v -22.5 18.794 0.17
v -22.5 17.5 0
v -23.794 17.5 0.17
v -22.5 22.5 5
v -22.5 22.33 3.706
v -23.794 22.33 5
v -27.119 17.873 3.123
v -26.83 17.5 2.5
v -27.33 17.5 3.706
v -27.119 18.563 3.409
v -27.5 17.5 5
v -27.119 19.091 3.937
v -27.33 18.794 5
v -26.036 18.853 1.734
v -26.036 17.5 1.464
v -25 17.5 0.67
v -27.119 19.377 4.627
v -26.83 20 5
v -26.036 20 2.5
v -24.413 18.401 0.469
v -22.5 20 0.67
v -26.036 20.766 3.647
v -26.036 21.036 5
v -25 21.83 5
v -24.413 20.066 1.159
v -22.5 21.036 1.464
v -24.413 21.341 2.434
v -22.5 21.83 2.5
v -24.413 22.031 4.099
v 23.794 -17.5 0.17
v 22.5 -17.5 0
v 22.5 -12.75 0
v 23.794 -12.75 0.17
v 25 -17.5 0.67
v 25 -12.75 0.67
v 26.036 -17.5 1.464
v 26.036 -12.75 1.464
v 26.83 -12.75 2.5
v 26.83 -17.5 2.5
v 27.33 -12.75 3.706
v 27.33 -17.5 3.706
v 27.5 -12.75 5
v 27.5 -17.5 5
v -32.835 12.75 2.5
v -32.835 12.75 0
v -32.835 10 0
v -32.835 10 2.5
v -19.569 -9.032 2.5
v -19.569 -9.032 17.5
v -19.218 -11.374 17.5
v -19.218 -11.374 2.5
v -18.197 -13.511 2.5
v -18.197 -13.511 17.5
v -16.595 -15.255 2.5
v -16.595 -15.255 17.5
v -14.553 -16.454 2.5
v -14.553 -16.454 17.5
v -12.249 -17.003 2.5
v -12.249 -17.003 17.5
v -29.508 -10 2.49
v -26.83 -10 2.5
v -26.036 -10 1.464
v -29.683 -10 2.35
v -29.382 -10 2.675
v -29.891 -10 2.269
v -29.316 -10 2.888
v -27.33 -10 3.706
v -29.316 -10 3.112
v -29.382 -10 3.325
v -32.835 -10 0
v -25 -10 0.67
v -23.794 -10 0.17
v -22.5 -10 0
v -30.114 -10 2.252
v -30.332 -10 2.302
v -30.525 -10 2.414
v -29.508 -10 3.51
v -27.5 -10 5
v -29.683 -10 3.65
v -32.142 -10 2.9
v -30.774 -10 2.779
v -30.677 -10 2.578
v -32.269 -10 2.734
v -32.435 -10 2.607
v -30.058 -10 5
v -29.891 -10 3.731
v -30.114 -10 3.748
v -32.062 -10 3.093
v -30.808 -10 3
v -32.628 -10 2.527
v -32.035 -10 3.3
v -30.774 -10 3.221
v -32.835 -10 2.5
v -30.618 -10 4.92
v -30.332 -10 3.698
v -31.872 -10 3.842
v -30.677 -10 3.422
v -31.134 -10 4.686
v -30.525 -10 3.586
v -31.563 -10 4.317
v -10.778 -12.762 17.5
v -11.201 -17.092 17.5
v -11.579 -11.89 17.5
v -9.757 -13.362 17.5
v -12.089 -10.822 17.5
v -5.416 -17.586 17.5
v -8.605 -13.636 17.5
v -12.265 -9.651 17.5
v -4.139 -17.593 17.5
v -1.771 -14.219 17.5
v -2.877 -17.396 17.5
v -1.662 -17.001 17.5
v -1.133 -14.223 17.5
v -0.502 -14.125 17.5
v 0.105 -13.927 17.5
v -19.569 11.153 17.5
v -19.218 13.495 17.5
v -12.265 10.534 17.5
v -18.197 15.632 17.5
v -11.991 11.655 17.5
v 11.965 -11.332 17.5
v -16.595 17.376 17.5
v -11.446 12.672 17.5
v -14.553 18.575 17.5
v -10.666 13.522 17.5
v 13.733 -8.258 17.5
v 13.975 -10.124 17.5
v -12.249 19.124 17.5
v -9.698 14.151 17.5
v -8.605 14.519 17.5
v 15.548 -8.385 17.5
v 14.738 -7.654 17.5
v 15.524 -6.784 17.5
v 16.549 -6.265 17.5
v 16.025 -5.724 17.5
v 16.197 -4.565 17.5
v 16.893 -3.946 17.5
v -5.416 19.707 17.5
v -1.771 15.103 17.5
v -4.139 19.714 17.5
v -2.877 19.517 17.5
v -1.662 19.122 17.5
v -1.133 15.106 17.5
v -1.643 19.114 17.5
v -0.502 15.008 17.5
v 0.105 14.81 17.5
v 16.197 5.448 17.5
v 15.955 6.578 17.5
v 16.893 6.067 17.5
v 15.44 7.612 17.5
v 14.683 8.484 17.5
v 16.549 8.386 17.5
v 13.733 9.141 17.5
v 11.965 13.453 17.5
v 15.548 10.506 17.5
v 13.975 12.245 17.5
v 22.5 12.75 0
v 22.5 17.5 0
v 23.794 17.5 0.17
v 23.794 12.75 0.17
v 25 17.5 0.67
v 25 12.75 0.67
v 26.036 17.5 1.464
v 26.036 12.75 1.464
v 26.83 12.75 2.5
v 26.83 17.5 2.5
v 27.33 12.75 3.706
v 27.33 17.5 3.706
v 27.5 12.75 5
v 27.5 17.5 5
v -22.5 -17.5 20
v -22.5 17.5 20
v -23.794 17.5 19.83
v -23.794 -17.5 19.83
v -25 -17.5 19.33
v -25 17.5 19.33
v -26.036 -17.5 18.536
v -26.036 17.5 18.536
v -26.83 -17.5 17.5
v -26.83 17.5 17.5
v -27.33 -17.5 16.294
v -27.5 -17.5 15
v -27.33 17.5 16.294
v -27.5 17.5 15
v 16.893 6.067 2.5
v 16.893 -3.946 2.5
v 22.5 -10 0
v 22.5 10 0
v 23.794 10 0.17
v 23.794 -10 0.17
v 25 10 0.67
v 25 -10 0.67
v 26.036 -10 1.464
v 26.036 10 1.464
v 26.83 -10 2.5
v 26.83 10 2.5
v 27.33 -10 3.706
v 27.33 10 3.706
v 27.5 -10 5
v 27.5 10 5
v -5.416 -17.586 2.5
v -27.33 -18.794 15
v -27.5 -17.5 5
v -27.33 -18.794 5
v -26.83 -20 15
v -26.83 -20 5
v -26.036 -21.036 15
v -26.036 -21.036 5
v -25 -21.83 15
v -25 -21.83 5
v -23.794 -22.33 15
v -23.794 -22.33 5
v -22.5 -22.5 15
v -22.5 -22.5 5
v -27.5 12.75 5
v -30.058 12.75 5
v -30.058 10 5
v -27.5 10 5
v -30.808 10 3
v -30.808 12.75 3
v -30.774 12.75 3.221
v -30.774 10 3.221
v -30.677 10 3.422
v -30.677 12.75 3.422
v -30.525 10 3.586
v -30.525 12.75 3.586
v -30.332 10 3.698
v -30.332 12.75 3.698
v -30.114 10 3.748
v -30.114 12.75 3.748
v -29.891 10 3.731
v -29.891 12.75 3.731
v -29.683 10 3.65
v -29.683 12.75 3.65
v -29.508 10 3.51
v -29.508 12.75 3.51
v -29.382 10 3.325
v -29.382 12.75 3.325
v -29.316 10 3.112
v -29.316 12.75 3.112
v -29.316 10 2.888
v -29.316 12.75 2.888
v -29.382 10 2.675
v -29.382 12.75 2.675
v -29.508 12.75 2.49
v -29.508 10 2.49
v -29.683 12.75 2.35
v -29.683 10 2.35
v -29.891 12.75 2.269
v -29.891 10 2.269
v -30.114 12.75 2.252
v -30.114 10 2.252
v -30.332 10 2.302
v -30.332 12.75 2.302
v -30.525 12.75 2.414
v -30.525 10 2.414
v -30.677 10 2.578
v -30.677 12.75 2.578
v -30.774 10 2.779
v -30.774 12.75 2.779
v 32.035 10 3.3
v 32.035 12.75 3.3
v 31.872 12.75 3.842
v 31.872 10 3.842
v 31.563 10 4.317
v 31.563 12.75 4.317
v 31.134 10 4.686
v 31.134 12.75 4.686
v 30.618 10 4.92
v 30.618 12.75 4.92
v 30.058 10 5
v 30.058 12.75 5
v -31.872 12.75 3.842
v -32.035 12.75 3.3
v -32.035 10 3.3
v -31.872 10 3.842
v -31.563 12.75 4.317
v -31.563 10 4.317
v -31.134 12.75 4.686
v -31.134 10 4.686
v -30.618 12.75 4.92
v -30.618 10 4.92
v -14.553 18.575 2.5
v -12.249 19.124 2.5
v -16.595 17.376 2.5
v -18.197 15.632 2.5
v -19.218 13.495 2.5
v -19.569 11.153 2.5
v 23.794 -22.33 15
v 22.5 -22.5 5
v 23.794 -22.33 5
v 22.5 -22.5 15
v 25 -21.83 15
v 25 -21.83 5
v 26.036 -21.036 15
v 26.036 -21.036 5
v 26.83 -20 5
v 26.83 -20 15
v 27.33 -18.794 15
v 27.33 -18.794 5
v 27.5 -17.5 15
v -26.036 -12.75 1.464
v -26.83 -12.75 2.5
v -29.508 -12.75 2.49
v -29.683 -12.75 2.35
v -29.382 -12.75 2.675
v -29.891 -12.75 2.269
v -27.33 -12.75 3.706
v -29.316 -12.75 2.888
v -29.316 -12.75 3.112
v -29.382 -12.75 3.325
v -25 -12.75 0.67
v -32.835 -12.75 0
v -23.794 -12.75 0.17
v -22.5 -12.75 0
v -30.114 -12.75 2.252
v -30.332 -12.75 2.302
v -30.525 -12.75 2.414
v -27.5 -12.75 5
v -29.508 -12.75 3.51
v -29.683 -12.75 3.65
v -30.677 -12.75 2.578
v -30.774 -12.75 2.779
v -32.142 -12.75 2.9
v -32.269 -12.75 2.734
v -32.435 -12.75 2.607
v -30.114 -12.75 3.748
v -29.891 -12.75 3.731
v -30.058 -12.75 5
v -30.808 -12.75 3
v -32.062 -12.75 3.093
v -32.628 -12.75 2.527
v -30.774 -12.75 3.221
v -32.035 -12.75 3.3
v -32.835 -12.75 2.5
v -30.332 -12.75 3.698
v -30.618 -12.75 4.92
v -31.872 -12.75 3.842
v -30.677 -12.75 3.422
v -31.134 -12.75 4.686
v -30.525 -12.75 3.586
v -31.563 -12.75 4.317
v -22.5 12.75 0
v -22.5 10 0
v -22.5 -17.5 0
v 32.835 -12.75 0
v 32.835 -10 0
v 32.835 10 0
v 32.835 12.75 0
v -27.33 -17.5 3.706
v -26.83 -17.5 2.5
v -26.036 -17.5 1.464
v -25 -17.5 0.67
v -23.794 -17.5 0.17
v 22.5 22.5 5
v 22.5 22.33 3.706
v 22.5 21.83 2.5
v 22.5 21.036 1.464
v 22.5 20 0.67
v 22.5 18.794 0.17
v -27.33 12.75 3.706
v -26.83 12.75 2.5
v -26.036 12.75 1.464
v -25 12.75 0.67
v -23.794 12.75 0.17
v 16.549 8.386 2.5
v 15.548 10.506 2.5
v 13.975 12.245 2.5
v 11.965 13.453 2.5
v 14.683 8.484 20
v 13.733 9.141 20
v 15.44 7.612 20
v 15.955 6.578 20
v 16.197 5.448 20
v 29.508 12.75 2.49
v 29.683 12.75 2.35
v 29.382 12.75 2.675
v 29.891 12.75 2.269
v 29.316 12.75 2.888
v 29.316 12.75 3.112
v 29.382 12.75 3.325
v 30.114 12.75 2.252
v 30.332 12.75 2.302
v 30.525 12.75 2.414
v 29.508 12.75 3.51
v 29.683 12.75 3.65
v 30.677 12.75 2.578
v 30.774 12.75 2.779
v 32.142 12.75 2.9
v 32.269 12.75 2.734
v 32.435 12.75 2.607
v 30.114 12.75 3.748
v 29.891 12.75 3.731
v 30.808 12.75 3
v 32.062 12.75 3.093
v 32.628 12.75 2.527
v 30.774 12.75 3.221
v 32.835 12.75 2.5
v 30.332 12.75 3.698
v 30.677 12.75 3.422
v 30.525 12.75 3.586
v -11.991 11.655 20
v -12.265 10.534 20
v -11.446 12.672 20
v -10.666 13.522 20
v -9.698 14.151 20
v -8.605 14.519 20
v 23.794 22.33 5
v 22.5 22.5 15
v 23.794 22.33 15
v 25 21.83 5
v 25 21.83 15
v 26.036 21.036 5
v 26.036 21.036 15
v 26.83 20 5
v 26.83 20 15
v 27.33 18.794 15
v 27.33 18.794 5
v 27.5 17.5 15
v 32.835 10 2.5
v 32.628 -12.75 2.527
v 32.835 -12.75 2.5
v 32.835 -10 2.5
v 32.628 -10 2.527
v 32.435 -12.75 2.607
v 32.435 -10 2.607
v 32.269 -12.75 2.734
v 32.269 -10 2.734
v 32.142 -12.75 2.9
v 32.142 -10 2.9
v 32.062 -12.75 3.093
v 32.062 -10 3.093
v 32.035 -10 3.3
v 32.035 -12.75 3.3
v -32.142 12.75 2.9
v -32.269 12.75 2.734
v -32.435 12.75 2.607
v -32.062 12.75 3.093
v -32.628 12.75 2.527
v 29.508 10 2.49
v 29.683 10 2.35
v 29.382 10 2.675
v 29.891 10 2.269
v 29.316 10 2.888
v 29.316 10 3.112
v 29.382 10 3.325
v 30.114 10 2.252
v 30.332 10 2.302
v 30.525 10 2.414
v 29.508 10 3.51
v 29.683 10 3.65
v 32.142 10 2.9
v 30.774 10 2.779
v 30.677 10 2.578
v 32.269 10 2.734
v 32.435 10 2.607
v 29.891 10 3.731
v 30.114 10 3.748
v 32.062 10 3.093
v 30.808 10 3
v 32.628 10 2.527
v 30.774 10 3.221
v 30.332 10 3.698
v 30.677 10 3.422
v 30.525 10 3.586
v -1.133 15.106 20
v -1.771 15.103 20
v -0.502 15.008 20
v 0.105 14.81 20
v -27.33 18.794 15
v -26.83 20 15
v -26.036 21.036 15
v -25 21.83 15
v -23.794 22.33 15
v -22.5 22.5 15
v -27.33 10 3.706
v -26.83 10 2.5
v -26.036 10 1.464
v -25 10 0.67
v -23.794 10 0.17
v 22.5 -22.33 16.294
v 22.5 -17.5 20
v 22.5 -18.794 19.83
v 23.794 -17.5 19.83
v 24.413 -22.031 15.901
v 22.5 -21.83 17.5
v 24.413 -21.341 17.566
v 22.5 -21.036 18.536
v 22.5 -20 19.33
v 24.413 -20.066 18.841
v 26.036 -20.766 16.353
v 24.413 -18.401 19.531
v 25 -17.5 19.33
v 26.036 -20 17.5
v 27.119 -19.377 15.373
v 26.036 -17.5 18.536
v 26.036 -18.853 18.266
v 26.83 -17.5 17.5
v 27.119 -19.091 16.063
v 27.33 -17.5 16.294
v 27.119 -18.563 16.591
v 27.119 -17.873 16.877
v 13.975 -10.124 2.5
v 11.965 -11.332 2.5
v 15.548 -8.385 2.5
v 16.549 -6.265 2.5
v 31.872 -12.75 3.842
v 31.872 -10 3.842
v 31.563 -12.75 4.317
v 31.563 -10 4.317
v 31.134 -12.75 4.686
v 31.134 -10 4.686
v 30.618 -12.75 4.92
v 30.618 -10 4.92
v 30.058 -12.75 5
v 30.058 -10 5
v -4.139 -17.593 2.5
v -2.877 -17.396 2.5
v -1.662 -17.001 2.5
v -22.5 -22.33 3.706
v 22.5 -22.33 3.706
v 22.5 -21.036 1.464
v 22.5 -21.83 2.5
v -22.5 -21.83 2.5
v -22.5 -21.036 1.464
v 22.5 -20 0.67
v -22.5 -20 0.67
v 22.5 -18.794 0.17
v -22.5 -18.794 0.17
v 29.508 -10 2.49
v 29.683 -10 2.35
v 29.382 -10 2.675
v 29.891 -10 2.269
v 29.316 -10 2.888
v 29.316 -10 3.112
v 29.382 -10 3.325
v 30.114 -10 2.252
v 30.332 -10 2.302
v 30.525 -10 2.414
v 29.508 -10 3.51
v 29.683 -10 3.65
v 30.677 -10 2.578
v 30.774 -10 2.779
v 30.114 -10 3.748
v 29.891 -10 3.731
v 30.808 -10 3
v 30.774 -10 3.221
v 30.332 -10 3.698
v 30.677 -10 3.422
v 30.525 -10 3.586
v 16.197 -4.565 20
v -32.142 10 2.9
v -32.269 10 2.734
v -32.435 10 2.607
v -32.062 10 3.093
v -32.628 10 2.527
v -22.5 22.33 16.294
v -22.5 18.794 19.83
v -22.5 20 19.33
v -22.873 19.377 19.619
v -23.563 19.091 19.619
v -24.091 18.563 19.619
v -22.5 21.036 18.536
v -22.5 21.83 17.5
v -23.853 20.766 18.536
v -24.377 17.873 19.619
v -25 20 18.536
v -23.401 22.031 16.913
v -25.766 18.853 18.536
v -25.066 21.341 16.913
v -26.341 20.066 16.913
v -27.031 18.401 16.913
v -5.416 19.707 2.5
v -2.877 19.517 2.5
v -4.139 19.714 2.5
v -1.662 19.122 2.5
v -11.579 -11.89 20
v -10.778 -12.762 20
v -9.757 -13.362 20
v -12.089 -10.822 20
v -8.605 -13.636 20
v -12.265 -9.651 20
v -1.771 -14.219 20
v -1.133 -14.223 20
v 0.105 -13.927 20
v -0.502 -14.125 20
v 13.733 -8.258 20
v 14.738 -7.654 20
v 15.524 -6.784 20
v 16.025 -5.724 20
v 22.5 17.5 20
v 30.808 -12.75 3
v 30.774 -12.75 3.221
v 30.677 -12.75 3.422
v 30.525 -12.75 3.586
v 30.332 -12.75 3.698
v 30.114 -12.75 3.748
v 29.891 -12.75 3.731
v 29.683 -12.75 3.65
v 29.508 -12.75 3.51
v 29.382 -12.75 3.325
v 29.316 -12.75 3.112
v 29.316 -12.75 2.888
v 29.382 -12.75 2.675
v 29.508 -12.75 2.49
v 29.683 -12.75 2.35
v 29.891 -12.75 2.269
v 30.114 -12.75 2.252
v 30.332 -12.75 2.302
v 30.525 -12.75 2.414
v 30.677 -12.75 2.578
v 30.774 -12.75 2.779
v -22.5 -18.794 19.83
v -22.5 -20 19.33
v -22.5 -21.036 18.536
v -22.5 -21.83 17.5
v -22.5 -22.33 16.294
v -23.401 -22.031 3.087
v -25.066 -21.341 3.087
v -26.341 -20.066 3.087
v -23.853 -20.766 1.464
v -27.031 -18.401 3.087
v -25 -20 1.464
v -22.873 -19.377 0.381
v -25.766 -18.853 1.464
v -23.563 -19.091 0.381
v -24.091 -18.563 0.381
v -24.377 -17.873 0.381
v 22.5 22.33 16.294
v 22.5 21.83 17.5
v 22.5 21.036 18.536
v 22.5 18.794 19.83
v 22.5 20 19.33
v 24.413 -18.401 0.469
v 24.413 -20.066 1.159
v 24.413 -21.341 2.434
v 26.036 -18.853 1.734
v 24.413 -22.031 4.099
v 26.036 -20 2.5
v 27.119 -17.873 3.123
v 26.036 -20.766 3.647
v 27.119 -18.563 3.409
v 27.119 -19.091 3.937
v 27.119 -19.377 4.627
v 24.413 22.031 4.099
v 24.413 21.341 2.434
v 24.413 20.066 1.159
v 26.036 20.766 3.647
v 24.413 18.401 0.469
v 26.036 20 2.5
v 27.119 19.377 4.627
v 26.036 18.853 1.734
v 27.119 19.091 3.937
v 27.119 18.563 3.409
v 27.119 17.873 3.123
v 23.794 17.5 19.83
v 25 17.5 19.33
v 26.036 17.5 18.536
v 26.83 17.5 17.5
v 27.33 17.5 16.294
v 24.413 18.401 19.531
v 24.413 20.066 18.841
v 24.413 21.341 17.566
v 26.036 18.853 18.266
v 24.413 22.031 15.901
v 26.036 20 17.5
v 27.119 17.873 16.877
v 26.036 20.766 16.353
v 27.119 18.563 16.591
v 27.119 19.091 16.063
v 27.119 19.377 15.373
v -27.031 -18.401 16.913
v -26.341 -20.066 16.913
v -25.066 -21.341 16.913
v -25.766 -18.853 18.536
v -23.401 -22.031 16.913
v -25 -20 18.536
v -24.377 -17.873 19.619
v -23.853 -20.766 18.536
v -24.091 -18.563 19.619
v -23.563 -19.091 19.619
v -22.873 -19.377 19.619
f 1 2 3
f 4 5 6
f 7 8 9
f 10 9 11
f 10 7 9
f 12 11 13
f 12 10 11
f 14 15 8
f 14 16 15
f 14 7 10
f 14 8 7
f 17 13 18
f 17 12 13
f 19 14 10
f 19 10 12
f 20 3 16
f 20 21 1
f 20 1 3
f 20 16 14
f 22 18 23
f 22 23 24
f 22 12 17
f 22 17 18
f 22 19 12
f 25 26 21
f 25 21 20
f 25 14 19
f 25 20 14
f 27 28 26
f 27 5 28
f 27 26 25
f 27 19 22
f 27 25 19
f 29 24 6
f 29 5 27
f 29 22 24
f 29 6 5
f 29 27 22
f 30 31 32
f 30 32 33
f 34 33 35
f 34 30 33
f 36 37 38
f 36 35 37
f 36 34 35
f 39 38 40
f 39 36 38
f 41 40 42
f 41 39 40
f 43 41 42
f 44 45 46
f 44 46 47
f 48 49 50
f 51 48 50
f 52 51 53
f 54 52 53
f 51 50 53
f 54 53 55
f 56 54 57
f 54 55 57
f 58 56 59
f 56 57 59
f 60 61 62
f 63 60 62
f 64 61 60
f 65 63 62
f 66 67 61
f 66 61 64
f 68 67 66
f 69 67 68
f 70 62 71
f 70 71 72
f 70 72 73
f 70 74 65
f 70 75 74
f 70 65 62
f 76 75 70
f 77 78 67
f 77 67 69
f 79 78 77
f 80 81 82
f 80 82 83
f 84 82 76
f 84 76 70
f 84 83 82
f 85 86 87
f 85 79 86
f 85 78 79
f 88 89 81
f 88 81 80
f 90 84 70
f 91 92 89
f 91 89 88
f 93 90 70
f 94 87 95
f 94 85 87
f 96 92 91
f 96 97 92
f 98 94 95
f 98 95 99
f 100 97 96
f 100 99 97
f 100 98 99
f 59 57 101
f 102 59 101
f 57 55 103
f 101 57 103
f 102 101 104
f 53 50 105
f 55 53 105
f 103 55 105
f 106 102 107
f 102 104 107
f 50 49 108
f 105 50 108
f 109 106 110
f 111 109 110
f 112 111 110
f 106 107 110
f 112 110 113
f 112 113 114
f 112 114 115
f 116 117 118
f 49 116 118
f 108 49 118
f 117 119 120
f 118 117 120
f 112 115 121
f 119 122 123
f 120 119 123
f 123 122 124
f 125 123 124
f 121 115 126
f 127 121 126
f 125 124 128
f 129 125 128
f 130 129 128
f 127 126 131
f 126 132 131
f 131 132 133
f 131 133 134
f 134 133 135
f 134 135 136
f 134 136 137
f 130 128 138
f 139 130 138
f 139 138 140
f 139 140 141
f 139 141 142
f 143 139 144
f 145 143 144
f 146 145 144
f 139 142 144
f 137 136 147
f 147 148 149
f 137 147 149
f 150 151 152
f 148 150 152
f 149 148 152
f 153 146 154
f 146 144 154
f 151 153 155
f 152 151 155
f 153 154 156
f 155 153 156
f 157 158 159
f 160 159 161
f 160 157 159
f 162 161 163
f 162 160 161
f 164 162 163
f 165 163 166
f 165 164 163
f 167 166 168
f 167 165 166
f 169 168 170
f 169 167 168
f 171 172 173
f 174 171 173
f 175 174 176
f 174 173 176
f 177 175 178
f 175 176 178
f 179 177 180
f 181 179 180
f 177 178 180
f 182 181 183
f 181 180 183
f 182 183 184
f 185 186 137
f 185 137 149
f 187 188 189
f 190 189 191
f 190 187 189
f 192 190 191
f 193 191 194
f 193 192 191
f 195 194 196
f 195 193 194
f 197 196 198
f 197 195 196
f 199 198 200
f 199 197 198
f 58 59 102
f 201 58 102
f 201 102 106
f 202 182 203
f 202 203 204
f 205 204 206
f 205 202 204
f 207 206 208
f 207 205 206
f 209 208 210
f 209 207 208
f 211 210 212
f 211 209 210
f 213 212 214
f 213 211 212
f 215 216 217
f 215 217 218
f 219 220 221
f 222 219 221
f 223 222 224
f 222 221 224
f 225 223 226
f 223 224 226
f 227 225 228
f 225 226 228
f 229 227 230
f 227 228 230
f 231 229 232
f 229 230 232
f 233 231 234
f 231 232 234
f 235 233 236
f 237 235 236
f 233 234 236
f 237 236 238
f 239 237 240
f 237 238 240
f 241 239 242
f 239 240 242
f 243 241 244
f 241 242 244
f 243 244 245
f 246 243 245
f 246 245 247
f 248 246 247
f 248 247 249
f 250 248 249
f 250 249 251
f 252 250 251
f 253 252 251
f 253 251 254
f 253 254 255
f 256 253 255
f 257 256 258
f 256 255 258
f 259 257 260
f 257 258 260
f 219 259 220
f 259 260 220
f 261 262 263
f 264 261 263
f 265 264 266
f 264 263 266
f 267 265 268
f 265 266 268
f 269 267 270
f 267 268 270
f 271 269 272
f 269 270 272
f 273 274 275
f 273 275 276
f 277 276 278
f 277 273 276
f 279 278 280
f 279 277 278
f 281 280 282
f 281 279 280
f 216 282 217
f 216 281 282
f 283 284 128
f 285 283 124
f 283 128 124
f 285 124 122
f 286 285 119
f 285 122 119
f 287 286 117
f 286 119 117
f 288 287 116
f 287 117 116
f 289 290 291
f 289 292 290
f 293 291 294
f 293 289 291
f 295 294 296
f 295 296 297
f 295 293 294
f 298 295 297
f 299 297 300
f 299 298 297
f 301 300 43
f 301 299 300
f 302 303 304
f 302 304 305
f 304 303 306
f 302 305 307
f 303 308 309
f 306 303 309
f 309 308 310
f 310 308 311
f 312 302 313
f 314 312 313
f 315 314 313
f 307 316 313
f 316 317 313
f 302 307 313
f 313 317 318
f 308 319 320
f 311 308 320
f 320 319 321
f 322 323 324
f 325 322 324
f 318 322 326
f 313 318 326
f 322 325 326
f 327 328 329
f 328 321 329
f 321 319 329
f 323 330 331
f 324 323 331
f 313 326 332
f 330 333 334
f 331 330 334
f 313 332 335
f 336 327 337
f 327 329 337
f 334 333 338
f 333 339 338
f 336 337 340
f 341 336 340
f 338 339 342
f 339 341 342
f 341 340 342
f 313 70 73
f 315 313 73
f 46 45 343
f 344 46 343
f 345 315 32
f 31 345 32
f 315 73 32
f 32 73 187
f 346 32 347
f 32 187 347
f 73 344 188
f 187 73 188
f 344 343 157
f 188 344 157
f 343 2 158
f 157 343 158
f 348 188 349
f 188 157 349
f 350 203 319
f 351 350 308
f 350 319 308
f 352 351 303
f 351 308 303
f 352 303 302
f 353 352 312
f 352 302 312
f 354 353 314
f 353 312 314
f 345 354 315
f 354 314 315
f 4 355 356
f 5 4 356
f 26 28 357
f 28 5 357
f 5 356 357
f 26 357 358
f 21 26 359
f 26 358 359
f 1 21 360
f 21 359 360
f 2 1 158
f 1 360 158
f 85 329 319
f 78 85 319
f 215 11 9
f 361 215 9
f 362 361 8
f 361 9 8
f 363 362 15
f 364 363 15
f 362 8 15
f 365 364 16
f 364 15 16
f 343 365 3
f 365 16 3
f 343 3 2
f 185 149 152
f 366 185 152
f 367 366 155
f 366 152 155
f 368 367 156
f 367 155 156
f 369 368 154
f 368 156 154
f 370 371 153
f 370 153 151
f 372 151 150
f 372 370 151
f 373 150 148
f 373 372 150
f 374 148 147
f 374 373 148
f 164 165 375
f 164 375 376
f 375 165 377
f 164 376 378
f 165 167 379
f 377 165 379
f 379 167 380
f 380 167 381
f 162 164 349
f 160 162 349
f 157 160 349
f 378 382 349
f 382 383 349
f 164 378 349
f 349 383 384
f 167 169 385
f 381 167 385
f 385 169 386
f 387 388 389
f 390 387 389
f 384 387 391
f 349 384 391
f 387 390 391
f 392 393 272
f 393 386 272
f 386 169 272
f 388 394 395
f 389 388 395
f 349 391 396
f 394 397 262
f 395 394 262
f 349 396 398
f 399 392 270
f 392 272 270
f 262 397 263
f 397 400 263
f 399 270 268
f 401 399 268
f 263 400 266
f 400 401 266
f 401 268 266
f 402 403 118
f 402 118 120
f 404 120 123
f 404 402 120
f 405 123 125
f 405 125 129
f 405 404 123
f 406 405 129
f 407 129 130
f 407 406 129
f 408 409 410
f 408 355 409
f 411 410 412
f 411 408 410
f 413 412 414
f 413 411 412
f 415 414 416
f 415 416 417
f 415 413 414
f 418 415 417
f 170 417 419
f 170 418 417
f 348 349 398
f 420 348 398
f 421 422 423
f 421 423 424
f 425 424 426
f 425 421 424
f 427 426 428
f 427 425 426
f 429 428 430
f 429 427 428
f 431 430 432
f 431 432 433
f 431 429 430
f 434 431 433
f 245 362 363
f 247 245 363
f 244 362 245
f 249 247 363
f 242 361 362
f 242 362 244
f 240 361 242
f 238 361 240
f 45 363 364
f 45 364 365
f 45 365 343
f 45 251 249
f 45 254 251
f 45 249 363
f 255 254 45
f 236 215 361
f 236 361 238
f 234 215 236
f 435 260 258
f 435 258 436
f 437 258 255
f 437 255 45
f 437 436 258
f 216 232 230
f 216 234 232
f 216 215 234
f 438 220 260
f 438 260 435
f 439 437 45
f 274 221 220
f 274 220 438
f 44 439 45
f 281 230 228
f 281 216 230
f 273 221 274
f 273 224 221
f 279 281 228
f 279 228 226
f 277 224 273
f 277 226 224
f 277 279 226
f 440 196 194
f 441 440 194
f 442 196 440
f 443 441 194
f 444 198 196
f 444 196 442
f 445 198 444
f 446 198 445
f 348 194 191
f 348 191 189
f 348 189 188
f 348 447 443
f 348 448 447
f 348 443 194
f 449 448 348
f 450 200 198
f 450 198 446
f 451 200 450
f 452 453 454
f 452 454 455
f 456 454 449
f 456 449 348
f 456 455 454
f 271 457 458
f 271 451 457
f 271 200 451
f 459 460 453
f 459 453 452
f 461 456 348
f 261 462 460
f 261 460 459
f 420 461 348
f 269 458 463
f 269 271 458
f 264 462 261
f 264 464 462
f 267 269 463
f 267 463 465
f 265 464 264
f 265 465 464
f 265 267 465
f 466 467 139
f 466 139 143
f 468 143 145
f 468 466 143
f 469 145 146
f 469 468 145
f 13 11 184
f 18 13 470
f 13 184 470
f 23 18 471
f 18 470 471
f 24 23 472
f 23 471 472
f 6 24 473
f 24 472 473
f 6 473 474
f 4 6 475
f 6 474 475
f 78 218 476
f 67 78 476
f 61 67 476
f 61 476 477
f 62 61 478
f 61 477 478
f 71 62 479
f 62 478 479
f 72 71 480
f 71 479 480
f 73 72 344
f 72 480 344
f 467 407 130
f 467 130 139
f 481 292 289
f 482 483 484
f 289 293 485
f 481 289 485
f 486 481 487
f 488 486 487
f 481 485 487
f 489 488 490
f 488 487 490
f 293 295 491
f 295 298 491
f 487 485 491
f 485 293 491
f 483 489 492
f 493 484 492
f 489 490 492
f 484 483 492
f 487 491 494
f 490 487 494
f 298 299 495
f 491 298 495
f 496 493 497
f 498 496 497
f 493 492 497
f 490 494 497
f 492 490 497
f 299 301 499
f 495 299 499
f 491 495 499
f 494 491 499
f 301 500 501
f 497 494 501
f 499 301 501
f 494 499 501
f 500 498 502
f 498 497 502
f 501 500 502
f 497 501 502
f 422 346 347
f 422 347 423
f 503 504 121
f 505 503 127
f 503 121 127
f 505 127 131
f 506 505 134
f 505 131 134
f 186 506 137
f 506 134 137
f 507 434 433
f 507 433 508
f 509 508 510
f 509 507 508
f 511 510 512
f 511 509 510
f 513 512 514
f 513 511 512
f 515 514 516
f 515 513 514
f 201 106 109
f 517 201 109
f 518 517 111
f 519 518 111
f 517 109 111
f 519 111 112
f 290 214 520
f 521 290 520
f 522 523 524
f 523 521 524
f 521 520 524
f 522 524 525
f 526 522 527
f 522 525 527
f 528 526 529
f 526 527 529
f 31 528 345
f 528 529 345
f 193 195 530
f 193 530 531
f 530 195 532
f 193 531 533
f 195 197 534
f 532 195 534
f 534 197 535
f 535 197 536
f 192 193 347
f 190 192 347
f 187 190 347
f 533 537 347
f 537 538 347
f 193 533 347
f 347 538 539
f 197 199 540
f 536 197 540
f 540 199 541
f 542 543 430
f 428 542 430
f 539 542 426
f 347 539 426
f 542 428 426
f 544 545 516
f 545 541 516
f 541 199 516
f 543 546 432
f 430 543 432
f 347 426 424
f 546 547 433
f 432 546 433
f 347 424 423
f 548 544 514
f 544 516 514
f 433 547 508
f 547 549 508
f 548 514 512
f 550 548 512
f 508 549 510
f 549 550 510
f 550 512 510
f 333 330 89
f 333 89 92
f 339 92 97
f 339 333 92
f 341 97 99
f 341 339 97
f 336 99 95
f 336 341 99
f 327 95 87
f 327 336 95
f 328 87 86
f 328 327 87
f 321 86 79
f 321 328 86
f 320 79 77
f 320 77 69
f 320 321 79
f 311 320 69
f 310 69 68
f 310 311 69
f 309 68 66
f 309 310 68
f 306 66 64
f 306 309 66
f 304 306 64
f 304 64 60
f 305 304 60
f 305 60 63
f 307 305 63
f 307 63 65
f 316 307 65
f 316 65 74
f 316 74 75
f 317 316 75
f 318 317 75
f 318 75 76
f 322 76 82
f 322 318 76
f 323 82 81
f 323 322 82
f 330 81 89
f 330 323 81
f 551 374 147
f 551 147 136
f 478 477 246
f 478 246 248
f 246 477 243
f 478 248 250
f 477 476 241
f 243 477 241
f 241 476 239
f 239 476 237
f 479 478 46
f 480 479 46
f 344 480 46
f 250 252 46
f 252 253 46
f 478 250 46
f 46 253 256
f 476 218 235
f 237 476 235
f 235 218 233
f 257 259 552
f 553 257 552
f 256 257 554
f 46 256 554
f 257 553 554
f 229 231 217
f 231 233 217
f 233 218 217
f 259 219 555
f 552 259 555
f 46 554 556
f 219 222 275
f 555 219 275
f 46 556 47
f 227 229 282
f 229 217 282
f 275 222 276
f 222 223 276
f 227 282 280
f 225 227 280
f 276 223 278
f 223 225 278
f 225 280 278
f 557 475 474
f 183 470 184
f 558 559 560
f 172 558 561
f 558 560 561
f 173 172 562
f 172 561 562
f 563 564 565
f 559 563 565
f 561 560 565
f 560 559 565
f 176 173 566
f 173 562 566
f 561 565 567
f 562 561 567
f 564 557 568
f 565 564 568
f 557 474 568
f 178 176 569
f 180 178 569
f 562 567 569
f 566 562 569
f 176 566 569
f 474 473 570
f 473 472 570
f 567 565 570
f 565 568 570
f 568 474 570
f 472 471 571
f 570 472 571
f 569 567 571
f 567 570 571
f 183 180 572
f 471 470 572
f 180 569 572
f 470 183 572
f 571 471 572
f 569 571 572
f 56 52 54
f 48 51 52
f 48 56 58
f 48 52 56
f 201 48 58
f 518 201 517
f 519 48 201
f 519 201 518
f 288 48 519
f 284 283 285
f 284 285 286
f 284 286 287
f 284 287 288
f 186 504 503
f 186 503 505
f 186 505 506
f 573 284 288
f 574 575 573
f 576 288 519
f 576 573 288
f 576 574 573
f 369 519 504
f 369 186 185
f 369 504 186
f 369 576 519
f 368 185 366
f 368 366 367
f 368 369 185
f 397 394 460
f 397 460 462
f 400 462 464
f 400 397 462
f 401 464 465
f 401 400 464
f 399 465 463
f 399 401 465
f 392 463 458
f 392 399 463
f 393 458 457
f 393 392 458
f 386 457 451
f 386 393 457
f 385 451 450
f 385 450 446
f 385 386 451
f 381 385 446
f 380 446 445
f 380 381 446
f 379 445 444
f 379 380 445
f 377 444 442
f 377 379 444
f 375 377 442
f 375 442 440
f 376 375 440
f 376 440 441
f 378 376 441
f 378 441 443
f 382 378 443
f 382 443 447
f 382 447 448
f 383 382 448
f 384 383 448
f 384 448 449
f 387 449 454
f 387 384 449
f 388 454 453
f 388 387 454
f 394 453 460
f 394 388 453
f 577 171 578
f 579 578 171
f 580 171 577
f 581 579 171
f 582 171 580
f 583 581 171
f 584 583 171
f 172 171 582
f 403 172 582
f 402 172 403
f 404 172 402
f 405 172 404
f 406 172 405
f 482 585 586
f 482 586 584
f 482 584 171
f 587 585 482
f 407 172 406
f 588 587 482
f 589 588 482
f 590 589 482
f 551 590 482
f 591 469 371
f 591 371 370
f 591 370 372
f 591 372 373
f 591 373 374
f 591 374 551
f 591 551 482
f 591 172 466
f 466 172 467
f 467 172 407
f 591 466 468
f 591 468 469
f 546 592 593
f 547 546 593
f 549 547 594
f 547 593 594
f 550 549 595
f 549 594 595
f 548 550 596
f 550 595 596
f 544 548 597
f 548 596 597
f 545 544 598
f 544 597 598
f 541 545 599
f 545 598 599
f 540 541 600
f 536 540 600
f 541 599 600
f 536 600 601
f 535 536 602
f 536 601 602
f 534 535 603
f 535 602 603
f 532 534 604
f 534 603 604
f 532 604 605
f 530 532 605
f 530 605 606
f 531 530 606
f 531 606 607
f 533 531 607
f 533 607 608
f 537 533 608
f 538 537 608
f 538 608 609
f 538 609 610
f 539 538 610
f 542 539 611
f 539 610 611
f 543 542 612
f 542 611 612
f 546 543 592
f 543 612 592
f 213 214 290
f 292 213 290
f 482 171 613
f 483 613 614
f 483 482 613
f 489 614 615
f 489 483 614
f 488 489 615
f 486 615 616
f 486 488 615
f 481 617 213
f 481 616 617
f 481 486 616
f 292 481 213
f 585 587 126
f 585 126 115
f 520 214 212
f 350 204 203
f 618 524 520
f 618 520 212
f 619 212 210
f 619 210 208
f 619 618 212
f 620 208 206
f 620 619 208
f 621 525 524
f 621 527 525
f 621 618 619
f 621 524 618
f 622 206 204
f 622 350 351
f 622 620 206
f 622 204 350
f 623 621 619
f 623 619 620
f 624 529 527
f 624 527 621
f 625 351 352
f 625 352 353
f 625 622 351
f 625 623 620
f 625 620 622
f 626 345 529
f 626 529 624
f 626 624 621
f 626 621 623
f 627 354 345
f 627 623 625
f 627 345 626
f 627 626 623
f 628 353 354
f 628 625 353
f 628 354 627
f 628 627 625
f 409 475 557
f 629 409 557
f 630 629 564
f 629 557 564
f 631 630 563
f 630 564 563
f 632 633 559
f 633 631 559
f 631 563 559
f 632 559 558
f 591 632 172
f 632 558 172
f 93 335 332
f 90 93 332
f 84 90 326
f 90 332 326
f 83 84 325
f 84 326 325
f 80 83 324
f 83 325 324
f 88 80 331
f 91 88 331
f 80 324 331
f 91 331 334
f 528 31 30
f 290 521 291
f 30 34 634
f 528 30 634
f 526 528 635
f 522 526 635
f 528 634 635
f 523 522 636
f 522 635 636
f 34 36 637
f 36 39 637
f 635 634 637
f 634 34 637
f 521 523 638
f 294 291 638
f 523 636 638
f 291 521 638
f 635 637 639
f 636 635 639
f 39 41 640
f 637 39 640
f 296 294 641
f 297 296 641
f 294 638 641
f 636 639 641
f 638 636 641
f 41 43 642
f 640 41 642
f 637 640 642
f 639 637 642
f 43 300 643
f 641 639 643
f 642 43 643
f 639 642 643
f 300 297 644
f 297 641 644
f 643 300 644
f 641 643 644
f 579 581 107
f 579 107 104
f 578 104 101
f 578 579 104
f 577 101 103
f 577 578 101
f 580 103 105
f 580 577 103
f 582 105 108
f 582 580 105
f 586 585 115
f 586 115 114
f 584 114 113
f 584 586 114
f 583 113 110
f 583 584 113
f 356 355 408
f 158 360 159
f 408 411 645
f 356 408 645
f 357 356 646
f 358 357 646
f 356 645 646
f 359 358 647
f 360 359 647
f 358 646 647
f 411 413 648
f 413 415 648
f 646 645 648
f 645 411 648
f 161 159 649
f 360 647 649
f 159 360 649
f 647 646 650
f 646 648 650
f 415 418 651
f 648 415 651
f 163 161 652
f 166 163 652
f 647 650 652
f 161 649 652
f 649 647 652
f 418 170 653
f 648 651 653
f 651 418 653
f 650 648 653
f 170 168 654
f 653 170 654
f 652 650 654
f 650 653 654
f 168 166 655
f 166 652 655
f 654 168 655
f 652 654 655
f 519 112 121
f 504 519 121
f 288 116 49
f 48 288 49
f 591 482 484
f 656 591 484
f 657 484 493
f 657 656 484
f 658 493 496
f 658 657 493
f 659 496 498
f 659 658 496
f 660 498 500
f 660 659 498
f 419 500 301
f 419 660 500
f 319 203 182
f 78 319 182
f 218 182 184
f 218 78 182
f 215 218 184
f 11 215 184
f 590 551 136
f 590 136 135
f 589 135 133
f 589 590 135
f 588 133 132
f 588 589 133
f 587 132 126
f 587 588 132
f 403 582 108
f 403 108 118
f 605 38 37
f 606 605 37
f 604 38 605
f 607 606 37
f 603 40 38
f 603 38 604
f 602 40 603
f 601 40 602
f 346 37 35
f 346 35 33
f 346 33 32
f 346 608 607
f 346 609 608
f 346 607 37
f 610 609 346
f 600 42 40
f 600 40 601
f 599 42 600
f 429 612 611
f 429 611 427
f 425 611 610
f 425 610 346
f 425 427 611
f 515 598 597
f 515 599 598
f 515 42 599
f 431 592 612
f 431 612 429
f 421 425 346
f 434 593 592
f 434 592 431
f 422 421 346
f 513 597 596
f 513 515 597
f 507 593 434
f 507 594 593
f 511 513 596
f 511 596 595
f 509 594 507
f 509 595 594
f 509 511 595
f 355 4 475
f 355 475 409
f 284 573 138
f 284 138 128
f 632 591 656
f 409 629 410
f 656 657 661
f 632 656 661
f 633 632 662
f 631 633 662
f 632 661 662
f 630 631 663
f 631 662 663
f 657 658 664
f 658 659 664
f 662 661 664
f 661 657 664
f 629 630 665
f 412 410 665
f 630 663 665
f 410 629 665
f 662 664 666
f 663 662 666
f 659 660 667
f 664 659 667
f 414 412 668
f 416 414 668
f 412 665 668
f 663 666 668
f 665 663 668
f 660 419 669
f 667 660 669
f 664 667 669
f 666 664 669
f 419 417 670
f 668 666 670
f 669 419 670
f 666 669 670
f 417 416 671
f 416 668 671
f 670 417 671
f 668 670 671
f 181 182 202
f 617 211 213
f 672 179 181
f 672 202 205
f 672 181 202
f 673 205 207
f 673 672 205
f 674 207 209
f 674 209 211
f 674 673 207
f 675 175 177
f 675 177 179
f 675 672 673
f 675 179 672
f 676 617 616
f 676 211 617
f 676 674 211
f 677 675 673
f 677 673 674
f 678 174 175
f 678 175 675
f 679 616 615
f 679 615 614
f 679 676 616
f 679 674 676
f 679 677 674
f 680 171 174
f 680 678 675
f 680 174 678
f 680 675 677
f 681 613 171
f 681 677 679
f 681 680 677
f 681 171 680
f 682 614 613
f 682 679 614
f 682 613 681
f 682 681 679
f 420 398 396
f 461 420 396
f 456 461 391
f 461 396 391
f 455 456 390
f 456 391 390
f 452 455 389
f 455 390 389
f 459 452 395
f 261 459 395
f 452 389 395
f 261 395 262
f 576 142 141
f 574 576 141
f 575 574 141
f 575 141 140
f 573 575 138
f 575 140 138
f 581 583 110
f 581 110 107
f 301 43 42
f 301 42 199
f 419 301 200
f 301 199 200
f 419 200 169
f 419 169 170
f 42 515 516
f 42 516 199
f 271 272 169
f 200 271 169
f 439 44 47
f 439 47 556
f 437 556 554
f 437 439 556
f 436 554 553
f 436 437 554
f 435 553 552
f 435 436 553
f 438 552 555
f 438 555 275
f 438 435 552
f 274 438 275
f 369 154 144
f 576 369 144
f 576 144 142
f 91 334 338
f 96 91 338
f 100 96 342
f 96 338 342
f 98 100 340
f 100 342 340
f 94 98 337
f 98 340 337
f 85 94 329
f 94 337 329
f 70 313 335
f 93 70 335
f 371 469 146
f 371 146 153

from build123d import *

# Parameters (mm, degrees)
F0_W              = 55
F0_H              = 45
F1_DEPTH          = 20
F5_DEPTH          = 17.5
F7_DEPTH          = 2.5
F9_R              = 5
F10_F1_R          = 5
F10_F2_R          = 5
F11_T1_DEPTH      = 35
F11_T3_DEPTH      = 62.5
F11_S7_W          = 5
F11_S7_H          = 5
F11_T8_DEPTH      = 5
F11_T12_ANGLE     = 90
F12_R             = 5
F15_R             = 0.75
F16_DEPTH         = 2.75
F16_COPIES2_COUNT = 2


# Not quite as in the source:
# - a fillet or chamfer that OpenCascade refuses, or shapes differently, is made with other operations: its cross-section is extruded or revolved along the edge and cut away or added
# - a feature of the source that left no trace in its solid (it failed there, or was rolled back) is left out
# - a pattern or mirror of a feature is missing from the dataset's text; its kind, count and spacing are read off the source's solid


with BuildPart() as f1:
    # F0 (on Top) → F1 (new body)
    with BuildSketch(Plane.XY):
        Rectangle(F0_W, F0_H)
    extrude(amount=F1_DEPTH)

    # F4 (on face) → F5 (cut)
    with BuildSketch(Plane.XY.offset(20)):
        with BuildLine():
            Line((-19.5686819828, 11.1526907945), (-19.5686819828, 1.0604560375))
            Line((-19.5686819828, 1.0604560375), (-19.5686819828, -9.0317787194))
            ThreePointArc((-19.5686819828, -9.0317787194), (-17.4612029419, -14.4427117948), (-12.2491327961, -17.0027878582))
            Line((-12.2491327961, -17.0027878582), (-5.4155437946, -17.5861419999))
            ThreePointArc((-5.4155437946, -17.5861419999), (-3.5037525417, -17.5198024128), (-1.6623660017, -17.0014952208))
            Line((-1.6623660017, -17.0014952208), (11.9654898342, -11.3323067543))
            ThreePointArc((11.9654898342, -11.3323067543), (15.5479043196, -8.3854367171), (16.8927628547, -3.9459443945))
            Line((16.8927628547, -3.9459443945), (16.8927628547, 1.0604560375))
            Line((16.8927628547, 1.0604560375), (16.8927628547, 6.0668564696))
            ThreePointArc((16.8927628547, 6.0668564696), (15.5479043196, 10.5063487921), (11.9654898342, 13.4532188293))
            Line((11.9654898342, 13.4532188293), (-1.6623660017, 19.1224072959))
            ThreePointArc((-1.6623660017, 19.1224072959), (-3.5037525417, 19.6407144879), (-5.4155437946, 19.7070540749))
            Line((-5.4155437946, 19.7070540749), (-12.2491327961, 19.1236999333))
            ThreePointArc((-12.2491327961, 19.1236999333), (-17.4612029419, 16.5636238699), (-19.5686819828, 11.1526907945))
        make_face()
    extrude(amount=-F5_DEPTH, mode=Mode.SUBTRACT)

    # F6 (on face) → F7 (join)
    with BuildSketch(Plane.XY.offset(20)):
        with BuildLine():
            ThreePointArc((-12.2491327961, 19.1236999333), (-17.4612029419, 16.5636238699), (-19.5686819828, 11.1526907945))
            Line((-19.5686819828, 11.1526907945), (-19.5686819828, -9.0317787194))
            ThreePointArc((-19.5686819828, -9.0317787194), (-17.4612029419, -14.4427117948), (-12.2491327961, -17.0027878582))
            Line((-12.2491327961, -17.0027878582), (-11.2008683554, -17.0922736911))
            Line((-11.2008683554, -17.0922736911), (-5.4155437946, -17.5861419999))
            ThreePointArc((-5.4155437946, -17.5861419999), (-3.5037525417, -17.5198024128), (-1.6623660017, -17.0014952208))
            Line((-1.6623660017, -17.0014952208), (11.9654898342, -11.3323067543))
            ThreePointArc((11.9654898342, -11.3323067543), (15.5479043196, -8.3854367171), (16.8927628547, -3.9459443945))
            Line((16.8927628547, -3.9459443945), (16.8927628547, 6.0668564696))
            ThreePointArc((16.8927628547, 6.0668564696), (15.5479043196, 10.5063487921), (11.9654898342, 13.4532188293))
            Line((11.9654898342, 13.4532188293), (-1.6432446132, 19.1144527977))
            Line((-1.6432446132, 19.1144527977), (-1.6623660017, 19.1224072959))
            ThreePointArc((-1.6623660017, 19.1224072959), (-3.5037525417, 19.6407144879), (-5.4155437946, 19.7070540749))
            Line((-5.4155437946, 19.7070540749), (-12.2491327961, 19.1236999333))
        make_face()
        with BuildLine():
            Line((-12.2647350556, -9.6505587512), (-12.2647350556, 0.4416760057))
            Line((-12.2647350556, 0.4416760057), (-12.2647350556, 10.5339107627))
            ThreePointArc((-12.2647350556, 10.5339107627), (-11.0828219735, 13.1216791931), (-8.6049604623, 14.5194153321))
            Line((-8.6049604623, 14.5194153321), (-1.7713714607, 15.1027694737))
            ThreePointArc((-1.7713714607, 15.1027694737), (-0.8154758343, 15.0695996802), (0.1052174357, 14.8104460842))
            Line((0.1052174357, 14.8104460842), (13.7330732716, 9.1412576176))
            ThreePointArc((13.7330732716, 9.1412576176), (15.4399139751, 7.6115436145), (16.1967097819, 5.4480764378))
            Line((16.1967097819, 5.4480764378), (16.1967097819, 0.4416760057))
            Line((16.1967097819, 0.4416760057), (16.1967097819, -4.5647244263))
            ThreePointArc((16.1967097819, -4.5647244263), (15.5242805143, -6.7844705876), (13.7330732716, -8.2579056062))
            Line((13.7330732716, -8.2579056062), (0.1052174357, -13.9270940728))
            ThreePointArc((0.1052174357, -13.9270940728), (-0.8154758343, -14.1862476688), (-1.7713714607, -14.2194174623))
            Line((-1.7713714607, -14.2194174623), (-8.6049604623, -13.6360633206))
            ThreePointArc((-8.6049604623, -13.6360633206), (-11.2109955351, -12.3560252889), (-12.2647350556, -9.6505587512))
        make_face(mode=Mode.SUBTRACT)
    extrude(amount=-F7_DEPTH)

    # F9
    f9_edges = [f1.edges().sort_by_distance(p)[0] for p in [
        (-27.5, -22.5, 10),
        (0, -22.5, 20),
    ]]
    fillet(f9_edges, radius=F9_R)

    # F10: fillet of radius 5 on 2 edges, made by hand

    # F10_f1
    f10_f1_edges = [f1.edges().sort_by_distance(p)[0] for p in [
        (0, 22.5, 0),
    ]]
    fillet(f10_f1_edges, radius=F10_F1_R)

    # F10_f2
    f10_f2_edges = [f1.edges().sort_by_distance(p)[0] for p in [
        (-27.5, 22.5, 12.5),
    ]]
    fillet(f10_f2_edges, radius=F10_F2_R)

    # F11: fillet of radius 5 on 2 edges, made by hand

    # F11_s2 → F11_t1 (cut)
    with BuildSketch(Plane.XZ.offset(-17.5)):
        with BuildLine():
            ThreePointArc((-22.5, 20), (-26.0355339059, 18.5355339059), (-27.5, 15))
            Line((-27.5, 15), (-27.5, 20))
            Line((-27.5, 20), (-22.5, 20))
        make_face()
    extrude(amount=F11_T1_DEPTH, mode=Mode.SUBTRACT)

    # F11_s4 → F11_t3 (cut)
    with BuildSketch(Plane.YZ.offset(-22.5)):
        with BuildLine():
            ThreePointArc((22.5, 15), (21.0355339059, 18.5355339059), (17.5, 20))
            Line((17.5, 20), (22.5, 20))
            Line((22.5, 20), (22.5, 15))
        make_face()
    extrude(amount=F11_T3_DEPTH, mode=Mode.SUBTRACT)


with BuildPart() as f11_tool6:
    # F11_s7 → F11_t8 (new body)
    with BuildSketch(Plane.XY.offset(15)):
        with Locations((-25, -20)):
            Rectangle(F11_S7_W, F11_S7_H)
    extrude(amount=F11_T8_DEPTH)

    # F11_s9 → F11_t10 (revolve, cut)
    with BuildSketch(Plane(origin=(-22.5, -17.5, 15), x_dir=(0.7071067812, 0.7071067812, 0), z_dir=(0.7071067812, -0.7071067812, 0))):
        with BuildLine():
            ThreePointArc((0, -5), (5, 0), (0, 5))
            Line((0, 5), (0, -5))
        make_face()
    revolve(axis=Axis((-22.5, -17.5, 15), (0, 0, 1)), mode=Mode.SUBTRACT)


with BuildPart() as f1_1:
    add(f1.part)

    # F11_t5: cut F11_tool6
    add(f11_tool6.part, mode=Mode.SUBTRACT)

    # F11_s11 → F11_t12 (revolve, cut)
    with BuildSketch(Plane.YZ.offset(-22.5)):
        with BuildLine():
            ThreePointArc((17.5, 20), (21.0355339059, 18.5355339059), (22.5, 15))
            Line((22.5, 15), (22.5, 20))
            Line((22.5, 20), (17.5, 20))
        make_face()
    revolve(axis=Axis((-22.5, 17.5, 20), (0, 0, 1)), revolution_arc=F11_T12_ANGLE, mode=Mode.SUBTRACT)

    # F12
    f12_edges = [f1_1.edges().sort_by_distance(p)[0] for p in [
        (-22.5, -22.5, 10),
        (27.5, 21.035534, 1.464466),
        (27.5, 22.5, 10),
        (27.5, 21.035534, 18.535534),
        (27.5, 0, 20),
        (27.5, -21.035534, 18.535534),
        (27.5, -22.5, 10),
        (27.5, -21.035534, 1.464466),
    ]]
    fillet(f12_edges, radius=F12_R)

    # F15 (on offset) → F16 (join)
    with BuildSketch(Plane.XZ.offset(12.75)):
        with BuildLine():
            Line((30.0576982113, 5), (27.5, 5))
            ThreePointArc((27.5, 5), (26.0355339059, 1.4644660941), (22.5, 0))
            Line((22.5, 0), (32.8350702046, 0))
            Line((32.8350702046, 0), (32.8350702046, 2.5))
            ThreePointArc((32.8350702046, 2.5), (32.2693847797, 2.7343145751), (32.0350702046, 3.3))
            ThreePointArc((32.0350702046, 3.3), (31.3615386923, 4.5165750888), (30.0576982113, 5))
        make_face()
        with Locations((30.0576982113, 3)):
            Circle(F15_R, mode=Mode.SUBTRACT)
    f16 = extrude(amount=-F16_DEPTH)

    # F16_copies: F16 across plane
    add(f16.mirror(Plane(origin=(0, 0, 0), x_dir=(0, 0, -1), z_dir=(-1, 0, 0))))

    # F16_copies1: F16 across plane
    add(f16.mirror(Plane.ZX))

    # F16_copies2: F16 ×2 about axis
    f16_copies2_axis = Axis((0, 0, 0), (0, 0, 1))
    for i in range(1, F16_COPIES2_COUNT):
        add(f16.rotate(f16_copies2_axis, i * 360 / F16_COPIES2_COUNT))


solid = f1_1.part
